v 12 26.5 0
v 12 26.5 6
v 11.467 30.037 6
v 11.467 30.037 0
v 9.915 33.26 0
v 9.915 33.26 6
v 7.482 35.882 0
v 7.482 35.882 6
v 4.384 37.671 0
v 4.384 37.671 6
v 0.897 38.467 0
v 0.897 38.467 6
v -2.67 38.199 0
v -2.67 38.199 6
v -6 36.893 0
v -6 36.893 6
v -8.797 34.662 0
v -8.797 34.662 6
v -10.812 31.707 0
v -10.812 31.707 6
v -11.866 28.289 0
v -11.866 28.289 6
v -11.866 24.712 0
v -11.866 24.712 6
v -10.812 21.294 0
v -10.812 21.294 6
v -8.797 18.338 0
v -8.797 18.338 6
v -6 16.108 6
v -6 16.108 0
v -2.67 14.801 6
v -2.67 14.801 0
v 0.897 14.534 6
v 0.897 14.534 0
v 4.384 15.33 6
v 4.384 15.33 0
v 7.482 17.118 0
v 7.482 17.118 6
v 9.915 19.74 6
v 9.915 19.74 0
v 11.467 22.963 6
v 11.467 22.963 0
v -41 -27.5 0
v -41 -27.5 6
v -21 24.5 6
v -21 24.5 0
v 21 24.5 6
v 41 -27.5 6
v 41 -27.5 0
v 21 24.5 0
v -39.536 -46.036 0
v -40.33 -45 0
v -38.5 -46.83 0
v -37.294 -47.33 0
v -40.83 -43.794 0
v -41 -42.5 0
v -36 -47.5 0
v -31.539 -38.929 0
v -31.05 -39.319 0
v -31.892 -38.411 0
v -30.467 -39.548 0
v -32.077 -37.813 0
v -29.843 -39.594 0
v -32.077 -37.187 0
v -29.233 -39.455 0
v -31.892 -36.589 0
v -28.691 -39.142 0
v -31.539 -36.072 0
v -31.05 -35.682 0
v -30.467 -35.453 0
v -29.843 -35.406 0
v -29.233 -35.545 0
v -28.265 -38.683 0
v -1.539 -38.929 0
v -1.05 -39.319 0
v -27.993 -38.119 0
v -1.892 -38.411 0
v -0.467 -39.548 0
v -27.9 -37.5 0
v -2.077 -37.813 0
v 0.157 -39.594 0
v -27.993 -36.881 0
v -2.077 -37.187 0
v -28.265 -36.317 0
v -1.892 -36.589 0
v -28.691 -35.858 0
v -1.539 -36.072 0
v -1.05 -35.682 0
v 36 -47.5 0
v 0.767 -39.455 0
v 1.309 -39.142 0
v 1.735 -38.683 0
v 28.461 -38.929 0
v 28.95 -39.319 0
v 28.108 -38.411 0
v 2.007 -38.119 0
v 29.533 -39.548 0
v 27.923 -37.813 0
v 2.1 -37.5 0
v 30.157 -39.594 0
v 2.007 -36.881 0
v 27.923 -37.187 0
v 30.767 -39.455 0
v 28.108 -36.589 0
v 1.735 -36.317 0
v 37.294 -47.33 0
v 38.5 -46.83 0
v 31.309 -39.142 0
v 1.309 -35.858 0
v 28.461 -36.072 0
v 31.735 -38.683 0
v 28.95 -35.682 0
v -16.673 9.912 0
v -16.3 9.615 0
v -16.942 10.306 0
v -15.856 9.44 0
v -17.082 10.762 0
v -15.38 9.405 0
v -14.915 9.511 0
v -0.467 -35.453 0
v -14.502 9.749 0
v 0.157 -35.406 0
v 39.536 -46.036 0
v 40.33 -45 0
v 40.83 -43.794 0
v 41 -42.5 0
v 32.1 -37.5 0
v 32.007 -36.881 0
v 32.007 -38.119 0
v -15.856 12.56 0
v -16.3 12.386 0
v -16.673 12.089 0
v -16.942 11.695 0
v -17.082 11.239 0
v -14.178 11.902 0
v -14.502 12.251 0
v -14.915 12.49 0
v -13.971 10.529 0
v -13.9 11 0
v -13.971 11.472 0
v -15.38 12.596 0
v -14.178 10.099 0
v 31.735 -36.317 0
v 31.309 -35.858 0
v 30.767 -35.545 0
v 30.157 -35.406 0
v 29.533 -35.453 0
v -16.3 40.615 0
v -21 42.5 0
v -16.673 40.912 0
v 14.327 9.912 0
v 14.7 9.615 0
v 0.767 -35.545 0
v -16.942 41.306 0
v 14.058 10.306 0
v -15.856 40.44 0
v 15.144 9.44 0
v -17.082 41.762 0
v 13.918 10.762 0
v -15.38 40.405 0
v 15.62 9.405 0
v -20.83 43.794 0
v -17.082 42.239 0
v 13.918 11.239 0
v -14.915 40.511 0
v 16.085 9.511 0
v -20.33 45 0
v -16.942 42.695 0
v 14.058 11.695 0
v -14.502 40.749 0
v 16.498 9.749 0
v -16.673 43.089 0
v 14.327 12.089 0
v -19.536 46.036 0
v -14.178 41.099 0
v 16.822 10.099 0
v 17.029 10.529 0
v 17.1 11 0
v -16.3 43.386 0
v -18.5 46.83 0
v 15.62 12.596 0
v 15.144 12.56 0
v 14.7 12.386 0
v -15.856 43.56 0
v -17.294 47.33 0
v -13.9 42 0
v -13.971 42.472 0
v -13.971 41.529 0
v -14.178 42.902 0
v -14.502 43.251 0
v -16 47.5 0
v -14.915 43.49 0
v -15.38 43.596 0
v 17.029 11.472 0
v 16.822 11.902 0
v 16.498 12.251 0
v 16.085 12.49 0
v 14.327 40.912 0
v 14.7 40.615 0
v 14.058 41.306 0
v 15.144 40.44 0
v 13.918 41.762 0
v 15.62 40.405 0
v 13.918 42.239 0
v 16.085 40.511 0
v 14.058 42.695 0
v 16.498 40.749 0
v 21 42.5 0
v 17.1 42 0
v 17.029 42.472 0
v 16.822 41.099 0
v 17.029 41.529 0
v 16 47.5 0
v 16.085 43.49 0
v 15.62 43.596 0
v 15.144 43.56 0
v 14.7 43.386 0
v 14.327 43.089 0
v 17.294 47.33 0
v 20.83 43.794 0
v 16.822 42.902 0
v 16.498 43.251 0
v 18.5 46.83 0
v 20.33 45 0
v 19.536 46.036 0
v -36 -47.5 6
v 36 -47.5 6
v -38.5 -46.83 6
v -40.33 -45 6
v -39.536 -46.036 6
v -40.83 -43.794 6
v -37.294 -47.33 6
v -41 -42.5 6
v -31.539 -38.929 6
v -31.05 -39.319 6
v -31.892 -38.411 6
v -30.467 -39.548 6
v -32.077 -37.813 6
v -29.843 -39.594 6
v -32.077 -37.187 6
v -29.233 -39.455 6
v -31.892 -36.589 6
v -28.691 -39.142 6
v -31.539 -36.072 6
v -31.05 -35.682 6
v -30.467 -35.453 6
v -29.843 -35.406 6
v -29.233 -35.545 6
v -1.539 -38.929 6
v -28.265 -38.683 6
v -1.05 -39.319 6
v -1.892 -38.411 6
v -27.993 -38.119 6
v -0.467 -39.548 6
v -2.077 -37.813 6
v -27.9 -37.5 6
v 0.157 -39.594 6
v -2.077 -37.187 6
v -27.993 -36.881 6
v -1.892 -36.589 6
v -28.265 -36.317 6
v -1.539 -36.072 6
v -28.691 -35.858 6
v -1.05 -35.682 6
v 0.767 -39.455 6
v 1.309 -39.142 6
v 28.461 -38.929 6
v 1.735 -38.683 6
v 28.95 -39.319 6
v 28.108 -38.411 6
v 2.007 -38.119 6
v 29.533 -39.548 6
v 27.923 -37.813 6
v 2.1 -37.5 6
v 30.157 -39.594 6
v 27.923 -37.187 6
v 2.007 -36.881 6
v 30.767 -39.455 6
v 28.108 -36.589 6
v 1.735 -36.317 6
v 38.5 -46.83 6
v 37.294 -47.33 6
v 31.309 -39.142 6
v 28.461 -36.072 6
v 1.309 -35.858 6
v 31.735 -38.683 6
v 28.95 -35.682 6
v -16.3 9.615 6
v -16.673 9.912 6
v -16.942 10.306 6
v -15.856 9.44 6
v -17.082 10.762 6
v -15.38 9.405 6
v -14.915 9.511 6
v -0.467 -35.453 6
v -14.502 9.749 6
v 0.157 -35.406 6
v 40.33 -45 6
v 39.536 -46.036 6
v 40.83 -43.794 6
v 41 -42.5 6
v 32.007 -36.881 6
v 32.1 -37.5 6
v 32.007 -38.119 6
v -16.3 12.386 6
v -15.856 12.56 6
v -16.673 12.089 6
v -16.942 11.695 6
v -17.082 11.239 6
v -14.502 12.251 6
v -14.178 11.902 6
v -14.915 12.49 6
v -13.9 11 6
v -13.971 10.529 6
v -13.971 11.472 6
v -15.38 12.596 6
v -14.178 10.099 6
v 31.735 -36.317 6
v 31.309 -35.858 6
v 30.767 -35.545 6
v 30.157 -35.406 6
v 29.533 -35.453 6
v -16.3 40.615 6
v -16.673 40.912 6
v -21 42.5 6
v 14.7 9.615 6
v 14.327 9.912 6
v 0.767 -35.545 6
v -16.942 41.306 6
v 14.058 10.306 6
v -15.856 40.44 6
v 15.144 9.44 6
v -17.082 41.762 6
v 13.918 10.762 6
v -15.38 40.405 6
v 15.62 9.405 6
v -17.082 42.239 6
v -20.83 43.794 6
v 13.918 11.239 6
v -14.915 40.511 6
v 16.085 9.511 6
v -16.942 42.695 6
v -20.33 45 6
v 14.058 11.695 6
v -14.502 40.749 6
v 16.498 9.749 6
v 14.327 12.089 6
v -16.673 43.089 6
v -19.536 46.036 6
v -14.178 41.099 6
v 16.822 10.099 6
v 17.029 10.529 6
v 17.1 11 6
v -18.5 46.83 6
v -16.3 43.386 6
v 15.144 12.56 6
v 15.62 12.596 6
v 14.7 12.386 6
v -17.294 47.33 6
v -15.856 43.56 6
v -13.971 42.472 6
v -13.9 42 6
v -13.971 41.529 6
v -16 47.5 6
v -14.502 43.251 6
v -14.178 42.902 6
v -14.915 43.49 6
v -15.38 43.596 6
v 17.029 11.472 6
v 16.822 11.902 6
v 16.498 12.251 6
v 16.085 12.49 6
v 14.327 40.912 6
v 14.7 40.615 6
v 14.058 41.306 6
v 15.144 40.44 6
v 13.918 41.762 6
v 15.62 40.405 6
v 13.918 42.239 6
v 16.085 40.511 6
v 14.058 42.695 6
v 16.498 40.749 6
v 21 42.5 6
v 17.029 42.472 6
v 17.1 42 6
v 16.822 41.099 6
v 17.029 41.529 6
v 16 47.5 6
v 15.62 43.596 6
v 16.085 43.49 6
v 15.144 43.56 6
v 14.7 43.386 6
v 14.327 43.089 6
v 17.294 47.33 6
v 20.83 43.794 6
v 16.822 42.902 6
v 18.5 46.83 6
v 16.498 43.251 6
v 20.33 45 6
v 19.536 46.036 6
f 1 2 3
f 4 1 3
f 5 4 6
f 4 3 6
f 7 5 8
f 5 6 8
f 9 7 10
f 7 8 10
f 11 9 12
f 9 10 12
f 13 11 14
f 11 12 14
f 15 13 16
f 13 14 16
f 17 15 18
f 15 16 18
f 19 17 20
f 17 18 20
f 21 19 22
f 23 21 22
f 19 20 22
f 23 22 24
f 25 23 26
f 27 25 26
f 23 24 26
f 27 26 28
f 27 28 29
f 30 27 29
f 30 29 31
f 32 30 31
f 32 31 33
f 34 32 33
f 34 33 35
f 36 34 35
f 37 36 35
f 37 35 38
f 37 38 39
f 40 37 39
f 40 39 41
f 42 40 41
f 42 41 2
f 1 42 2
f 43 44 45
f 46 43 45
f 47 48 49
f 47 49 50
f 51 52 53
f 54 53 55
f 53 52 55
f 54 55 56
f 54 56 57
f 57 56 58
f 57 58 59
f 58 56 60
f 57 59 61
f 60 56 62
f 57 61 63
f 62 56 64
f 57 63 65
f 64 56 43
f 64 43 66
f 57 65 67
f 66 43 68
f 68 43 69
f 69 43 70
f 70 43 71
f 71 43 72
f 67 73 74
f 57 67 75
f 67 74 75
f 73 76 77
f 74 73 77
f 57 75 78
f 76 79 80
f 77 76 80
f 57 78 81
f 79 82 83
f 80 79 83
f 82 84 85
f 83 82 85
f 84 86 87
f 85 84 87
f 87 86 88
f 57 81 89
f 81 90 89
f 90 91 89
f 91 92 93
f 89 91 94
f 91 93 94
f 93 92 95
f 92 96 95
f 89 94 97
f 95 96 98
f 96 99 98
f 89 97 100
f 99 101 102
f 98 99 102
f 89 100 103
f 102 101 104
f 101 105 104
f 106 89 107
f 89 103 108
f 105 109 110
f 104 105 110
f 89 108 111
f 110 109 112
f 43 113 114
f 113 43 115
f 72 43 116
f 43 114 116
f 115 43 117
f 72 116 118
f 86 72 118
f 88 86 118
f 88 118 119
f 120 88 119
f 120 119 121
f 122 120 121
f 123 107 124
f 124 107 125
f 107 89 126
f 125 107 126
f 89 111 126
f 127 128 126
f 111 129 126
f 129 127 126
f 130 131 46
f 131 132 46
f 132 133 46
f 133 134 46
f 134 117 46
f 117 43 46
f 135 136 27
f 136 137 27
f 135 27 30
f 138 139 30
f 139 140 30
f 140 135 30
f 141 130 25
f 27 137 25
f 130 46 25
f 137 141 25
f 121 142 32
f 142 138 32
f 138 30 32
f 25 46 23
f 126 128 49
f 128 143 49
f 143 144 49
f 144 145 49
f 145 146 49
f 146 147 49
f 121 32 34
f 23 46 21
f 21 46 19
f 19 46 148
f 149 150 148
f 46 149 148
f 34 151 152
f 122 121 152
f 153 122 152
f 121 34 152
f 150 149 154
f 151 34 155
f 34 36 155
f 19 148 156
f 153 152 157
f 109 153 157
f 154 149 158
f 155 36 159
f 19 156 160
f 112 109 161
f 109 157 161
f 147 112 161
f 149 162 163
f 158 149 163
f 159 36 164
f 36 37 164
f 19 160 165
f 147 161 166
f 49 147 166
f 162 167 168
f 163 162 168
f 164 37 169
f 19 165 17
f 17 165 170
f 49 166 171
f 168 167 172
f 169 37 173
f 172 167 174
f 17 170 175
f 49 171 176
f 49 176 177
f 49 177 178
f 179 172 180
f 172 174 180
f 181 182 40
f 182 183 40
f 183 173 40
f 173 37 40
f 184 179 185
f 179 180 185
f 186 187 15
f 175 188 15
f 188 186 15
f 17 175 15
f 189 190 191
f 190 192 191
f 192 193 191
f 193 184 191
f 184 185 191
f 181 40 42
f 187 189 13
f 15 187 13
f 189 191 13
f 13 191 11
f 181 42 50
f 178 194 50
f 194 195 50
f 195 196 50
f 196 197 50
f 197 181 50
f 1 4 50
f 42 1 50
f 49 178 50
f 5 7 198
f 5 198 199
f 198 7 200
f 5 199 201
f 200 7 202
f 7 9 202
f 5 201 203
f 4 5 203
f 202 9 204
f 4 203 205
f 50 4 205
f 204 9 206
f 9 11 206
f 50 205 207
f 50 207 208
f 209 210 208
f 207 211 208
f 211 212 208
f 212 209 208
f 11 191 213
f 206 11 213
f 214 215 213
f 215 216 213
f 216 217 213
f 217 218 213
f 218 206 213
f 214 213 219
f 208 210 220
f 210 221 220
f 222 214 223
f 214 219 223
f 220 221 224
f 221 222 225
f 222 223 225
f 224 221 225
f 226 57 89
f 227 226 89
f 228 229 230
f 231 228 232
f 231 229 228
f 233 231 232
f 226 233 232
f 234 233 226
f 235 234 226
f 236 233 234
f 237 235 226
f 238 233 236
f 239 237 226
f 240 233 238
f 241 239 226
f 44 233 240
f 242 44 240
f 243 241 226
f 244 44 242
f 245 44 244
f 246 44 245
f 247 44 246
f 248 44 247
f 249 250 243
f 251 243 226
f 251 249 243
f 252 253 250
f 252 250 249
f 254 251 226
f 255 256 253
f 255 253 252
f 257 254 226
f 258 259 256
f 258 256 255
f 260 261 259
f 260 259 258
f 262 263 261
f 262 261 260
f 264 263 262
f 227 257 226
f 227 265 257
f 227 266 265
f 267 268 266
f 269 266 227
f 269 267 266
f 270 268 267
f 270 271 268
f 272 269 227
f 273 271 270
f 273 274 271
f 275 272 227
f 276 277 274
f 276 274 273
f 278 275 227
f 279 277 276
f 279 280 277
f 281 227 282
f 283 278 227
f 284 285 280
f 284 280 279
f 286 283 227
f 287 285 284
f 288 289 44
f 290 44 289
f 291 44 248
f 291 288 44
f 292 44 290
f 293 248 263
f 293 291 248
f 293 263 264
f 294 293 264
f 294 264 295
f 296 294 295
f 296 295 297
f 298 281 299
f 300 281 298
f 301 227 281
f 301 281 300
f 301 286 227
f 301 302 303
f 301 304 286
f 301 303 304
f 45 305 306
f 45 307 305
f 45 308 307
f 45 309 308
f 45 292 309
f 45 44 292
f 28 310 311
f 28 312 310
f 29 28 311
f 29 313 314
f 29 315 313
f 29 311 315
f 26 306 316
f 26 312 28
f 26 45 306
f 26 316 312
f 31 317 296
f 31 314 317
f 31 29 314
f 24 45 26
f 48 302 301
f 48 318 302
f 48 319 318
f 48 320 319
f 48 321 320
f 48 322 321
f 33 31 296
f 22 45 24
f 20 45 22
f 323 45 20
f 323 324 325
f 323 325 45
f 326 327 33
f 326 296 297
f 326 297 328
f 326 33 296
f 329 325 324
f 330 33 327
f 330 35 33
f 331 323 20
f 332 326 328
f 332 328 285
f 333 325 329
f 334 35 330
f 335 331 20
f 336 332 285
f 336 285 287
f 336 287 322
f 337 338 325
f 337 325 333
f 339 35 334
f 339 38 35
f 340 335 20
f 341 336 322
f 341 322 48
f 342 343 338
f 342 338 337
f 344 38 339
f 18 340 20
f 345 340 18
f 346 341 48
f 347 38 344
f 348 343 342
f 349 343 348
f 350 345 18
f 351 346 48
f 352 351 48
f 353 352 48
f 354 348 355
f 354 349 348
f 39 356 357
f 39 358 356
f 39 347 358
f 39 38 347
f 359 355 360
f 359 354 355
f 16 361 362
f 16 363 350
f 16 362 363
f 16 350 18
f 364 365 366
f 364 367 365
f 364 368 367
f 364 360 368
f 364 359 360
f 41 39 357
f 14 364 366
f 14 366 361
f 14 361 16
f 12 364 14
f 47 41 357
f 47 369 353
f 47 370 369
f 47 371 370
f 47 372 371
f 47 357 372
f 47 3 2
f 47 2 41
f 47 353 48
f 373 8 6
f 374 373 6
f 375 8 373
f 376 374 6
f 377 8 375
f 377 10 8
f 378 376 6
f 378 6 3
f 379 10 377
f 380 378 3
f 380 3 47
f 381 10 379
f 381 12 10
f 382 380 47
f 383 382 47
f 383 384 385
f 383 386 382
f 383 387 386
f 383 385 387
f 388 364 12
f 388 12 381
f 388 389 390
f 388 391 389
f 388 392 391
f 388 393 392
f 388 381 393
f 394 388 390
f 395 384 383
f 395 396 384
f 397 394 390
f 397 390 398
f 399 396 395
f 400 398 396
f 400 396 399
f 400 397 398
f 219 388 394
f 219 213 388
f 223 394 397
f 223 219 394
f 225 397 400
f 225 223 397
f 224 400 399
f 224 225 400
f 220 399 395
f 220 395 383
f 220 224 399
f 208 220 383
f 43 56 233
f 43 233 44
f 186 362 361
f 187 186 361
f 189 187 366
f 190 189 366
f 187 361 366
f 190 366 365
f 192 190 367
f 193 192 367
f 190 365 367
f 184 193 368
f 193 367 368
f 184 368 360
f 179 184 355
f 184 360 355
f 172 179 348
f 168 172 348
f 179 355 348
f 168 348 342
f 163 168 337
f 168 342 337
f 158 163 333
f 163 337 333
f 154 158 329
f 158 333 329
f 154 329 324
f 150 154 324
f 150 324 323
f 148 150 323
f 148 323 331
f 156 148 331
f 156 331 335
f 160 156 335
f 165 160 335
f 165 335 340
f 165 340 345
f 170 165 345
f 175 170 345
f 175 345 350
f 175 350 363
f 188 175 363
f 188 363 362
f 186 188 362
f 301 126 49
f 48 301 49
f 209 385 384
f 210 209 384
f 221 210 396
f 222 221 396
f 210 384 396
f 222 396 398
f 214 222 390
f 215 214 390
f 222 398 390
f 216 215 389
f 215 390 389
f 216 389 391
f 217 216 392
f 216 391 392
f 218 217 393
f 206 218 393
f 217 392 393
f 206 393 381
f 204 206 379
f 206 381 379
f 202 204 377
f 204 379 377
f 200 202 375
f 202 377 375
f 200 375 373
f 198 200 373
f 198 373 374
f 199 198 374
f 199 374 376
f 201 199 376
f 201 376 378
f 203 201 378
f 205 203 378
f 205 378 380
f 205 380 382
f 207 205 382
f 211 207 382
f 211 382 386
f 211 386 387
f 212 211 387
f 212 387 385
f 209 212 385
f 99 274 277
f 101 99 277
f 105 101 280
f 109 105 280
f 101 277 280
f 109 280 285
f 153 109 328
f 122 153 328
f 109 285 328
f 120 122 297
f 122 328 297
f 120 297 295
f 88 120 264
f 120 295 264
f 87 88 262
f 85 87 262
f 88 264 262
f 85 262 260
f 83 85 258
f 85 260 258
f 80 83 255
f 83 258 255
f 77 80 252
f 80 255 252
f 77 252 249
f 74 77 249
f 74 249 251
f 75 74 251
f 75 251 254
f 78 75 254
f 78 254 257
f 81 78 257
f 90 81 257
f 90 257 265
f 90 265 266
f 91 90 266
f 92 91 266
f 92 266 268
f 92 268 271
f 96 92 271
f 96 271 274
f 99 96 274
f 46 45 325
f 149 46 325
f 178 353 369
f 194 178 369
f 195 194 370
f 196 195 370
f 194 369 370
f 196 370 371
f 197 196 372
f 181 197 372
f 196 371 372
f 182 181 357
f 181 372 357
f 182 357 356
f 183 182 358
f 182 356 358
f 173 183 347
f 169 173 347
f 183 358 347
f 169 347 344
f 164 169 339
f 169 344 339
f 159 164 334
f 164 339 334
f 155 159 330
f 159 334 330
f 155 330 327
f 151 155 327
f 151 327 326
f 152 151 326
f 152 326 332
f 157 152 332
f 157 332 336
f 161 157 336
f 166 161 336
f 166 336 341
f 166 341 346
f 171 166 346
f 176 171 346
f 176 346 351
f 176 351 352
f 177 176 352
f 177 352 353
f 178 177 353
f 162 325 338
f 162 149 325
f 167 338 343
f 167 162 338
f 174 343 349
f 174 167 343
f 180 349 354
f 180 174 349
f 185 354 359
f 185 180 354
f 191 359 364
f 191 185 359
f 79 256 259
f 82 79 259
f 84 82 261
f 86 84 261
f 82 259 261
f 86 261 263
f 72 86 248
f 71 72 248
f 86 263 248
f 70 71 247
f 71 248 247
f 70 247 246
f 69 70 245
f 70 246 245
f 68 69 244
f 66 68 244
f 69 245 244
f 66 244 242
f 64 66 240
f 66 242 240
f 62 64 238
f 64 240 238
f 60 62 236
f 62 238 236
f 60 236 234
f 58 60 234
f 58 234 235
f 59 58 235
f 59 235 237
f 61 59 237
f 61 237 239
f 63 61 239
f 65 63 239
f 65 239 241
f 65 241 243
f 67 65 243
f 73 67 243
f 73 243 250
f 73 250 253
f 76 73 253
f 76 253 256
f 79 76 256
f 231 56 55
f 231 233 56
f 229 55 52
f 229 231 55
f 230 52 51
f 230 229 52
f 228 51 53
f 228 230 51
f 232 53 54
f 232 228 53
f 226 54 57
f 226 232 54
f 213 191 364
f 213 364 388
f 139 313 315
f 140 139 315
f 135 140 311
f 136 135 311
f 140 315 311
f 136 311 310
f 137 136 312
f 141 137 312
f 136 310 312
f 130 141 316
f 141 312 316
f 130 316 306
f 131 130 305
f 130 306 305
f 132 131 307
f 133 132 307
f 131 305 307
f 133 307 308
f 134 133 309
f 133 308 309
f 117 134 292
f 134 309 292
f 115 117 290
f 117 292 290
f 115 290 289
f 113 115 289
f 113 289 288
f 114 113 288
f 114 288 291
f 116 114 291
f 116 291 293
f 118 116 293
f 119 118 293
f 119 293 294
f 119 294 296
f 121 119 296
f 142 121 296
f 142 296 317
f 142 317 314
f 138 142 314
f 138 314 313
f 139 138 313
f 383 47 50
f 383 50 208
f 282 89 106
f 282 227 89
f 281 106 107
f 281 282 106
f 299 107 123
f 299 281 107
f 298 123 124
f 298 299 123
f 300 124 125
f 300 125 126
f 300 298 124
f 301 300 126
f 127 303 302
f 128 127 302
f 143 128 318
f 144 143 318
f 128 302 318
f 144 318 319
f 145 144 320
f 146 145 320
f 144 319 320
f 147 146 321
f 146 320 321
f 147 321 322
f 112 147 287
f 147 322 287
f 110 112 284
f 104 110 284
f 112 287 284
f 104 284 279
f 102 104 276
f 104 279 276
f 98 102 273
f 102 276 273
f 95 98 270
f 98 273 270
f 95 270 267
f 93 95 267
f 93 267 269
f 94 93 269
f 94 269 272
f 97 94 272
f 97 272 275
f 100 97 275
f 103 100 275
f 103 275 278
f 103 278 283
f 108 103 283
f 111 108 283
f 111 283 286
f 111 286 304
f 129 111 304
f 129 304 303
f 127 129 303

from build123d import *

# Parameters (mm, degrees)
F0_W     = 82
F0_H     = 95
F1_DEPTH = 6
F3_DEPTH = 6.001
F4_R     = 12
F4_R_2   = 1.6
F4_R_3   = 2.1
F5_DEPTH = 6.001
F6_R     = 5


# Not quite as in the source:
# - a pattern or mirror of a feature is missing from the dataset's text; its kind, count and spacing are read off the source's solid


with BuildPart() as f1:
    # F0 (on Top) → F1 (new body)
    with BuildSketch(Plane.XY):
        Rectangle(F0_W, F0_H)
    extrude(amount=F1_DEPTH)

    # F2 (on face) → F3 (cut, through all)
    with BuildSketch(Plane.XY.offset(6)):
        Polygon((-41, -27.5), (-21, 24.5), (-21, 47.5), (-41, 47.5), align=None)
    f3 = extrude(amount=-F3_DEPTH, mode=Mode.SUBTRACT)

    # F3_copies: F3 across plane
    add(f3.mirror(Plane(origin=(0, 0, 0), x_dir=(0, 0, 1), z_dir=(1, 0, 0))), mode=Mode.SUBTRACT)

    # F4 (on face) → F5 (cut, through all)
    with BuildSketch(Plane.XY.offset(6)):
        with Locations((0, 26.5003114)):
            Circle(F4_R)
        with Locations((15.5, 42.0003114)):
            Circle(F4_R_2)
        with Locations((-15.5, 42.0003114)):
            Circle(F4_R_2)
        with Locations((15.5, 11.0003114)):
            Circle(F4_R_2)
        with Locations((-15.5, 11.0003114)):
            Circle(F4_R_2)
        with Locations((-30, -37.5003114)):
            Circle(F4_R_3)
        with Locations((0, -37.5003114)):
            Circle(F4_R_3)
        with Locations((30, -37.5003114)):
            Circle(F4_R_3)
    extrude(amount=-F5_DEPTH, mode=Mode.SUBTRACT)

    # F6
    f6_edges = [f1.edges().sort_by_distance(p)[0] for p in [
        (-41, -47.5, 3),
        (41, -47.5, 3),
        (-21, 47.5, 3),
        (21, 47.5, 3),
    ]]
    fillet(f6_edges, radius=F6_R)


solid = f1.part
